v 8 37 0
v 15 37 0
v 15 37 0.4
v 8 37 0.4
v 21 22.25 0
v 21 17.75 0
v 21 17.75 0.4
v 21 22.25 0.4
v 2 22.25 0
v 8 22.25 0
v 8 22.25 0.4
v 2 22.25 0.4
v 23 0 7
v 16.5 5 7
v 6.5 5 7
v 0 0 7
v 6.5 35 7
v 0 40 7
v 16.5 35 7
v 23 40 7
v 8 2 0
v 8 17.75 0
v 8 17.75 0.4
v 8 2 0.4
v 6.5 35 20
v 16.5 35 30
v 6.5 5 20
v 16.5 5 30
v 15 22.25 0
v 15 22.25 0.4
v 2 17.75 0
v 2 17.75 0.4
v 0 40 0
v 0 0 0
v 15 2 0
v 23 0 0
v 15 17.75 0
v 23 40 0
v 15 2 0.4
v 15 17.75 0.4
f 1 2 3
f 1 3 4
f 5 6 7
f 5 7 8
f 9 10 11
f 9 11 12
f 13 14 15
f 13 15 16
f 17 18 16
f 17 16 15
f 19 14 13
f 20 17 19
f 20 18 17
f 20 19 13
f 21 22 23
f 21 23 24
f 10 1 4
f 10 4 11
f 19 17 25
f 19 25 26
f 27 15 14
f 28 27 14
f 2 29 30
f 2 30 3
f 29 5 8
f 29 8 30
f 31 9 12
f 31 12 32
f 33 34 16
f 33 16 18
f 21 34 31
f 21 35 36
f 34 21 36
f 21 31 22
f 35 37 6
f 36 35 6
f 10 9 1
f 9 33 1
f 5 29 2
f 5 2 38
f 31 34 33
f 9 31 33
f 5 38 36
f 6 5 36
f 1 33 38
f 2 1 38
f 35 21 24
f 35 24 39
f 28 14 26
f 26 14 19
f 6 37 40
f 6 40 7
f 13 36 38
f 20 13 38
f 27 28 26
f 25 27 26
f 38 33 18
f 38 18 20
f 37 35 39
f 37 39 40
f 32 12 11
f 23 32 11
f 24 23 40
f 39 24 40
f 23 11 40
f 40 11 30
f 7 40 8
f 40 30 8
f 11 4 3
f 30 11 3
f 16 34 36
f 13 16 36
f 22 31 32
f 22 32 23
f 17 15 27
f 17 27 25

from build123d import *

# Parameters (mm, degrees)
F0_W     = 23
F0_H     = 40
F1_DEPTH = 7
F2_W     = 10
F2_H     = 30
F3_DEPTH = 30
F5_DEPTH = 0.4
F6_SIZE  = 9.99999


# Not quite as in the source:
# - a fillet or chamfer is up to 0.001 mm smaller than in the source, because OpenCascade refuses the exact size


with BuildPart() as f1:
    # F0 (on Top) → F1 (new body)
    with BuildSketch(Plane.XY):
        with Locations((11.5, 20)):
            Rectangle(F0_W, F0_H)
    extrude(amount=F1_DEPTH)

    # F2 (on Top) → F3 (join)
    with BuildSketch(Plane.XY):
        with Locations((11.5, 20)):
            Rectangle(F2_W, F2_H)
    extrude(amount=F3_DEPTH)

    # F4 (on Top) → F5 (cut)
    with BuildSketch(Plane.XY):
        Polygon((8, 17.75), (8, 2), (15, 2), (15, 17.75), (21, 17.75), (21, 22.25), (15, 22.25), (15, 37), (8, 37), (8, 22.25), (2, 22.25), (2, 17.75), align=None)
    extrude(amount=F5_DEPTH, mode=Mode.SUBTRACT)

    # F6 (size 10 in the source; OpenCascade refuses exactly that, so slightly less here)
    f6_edges = [f1.edges().sort_by_distance(p)[0] for p in [
        (6.5, 20, 30),
    ]]
    chamfer(f6_edges, length=F6_SIZE)


solid = f1.part
